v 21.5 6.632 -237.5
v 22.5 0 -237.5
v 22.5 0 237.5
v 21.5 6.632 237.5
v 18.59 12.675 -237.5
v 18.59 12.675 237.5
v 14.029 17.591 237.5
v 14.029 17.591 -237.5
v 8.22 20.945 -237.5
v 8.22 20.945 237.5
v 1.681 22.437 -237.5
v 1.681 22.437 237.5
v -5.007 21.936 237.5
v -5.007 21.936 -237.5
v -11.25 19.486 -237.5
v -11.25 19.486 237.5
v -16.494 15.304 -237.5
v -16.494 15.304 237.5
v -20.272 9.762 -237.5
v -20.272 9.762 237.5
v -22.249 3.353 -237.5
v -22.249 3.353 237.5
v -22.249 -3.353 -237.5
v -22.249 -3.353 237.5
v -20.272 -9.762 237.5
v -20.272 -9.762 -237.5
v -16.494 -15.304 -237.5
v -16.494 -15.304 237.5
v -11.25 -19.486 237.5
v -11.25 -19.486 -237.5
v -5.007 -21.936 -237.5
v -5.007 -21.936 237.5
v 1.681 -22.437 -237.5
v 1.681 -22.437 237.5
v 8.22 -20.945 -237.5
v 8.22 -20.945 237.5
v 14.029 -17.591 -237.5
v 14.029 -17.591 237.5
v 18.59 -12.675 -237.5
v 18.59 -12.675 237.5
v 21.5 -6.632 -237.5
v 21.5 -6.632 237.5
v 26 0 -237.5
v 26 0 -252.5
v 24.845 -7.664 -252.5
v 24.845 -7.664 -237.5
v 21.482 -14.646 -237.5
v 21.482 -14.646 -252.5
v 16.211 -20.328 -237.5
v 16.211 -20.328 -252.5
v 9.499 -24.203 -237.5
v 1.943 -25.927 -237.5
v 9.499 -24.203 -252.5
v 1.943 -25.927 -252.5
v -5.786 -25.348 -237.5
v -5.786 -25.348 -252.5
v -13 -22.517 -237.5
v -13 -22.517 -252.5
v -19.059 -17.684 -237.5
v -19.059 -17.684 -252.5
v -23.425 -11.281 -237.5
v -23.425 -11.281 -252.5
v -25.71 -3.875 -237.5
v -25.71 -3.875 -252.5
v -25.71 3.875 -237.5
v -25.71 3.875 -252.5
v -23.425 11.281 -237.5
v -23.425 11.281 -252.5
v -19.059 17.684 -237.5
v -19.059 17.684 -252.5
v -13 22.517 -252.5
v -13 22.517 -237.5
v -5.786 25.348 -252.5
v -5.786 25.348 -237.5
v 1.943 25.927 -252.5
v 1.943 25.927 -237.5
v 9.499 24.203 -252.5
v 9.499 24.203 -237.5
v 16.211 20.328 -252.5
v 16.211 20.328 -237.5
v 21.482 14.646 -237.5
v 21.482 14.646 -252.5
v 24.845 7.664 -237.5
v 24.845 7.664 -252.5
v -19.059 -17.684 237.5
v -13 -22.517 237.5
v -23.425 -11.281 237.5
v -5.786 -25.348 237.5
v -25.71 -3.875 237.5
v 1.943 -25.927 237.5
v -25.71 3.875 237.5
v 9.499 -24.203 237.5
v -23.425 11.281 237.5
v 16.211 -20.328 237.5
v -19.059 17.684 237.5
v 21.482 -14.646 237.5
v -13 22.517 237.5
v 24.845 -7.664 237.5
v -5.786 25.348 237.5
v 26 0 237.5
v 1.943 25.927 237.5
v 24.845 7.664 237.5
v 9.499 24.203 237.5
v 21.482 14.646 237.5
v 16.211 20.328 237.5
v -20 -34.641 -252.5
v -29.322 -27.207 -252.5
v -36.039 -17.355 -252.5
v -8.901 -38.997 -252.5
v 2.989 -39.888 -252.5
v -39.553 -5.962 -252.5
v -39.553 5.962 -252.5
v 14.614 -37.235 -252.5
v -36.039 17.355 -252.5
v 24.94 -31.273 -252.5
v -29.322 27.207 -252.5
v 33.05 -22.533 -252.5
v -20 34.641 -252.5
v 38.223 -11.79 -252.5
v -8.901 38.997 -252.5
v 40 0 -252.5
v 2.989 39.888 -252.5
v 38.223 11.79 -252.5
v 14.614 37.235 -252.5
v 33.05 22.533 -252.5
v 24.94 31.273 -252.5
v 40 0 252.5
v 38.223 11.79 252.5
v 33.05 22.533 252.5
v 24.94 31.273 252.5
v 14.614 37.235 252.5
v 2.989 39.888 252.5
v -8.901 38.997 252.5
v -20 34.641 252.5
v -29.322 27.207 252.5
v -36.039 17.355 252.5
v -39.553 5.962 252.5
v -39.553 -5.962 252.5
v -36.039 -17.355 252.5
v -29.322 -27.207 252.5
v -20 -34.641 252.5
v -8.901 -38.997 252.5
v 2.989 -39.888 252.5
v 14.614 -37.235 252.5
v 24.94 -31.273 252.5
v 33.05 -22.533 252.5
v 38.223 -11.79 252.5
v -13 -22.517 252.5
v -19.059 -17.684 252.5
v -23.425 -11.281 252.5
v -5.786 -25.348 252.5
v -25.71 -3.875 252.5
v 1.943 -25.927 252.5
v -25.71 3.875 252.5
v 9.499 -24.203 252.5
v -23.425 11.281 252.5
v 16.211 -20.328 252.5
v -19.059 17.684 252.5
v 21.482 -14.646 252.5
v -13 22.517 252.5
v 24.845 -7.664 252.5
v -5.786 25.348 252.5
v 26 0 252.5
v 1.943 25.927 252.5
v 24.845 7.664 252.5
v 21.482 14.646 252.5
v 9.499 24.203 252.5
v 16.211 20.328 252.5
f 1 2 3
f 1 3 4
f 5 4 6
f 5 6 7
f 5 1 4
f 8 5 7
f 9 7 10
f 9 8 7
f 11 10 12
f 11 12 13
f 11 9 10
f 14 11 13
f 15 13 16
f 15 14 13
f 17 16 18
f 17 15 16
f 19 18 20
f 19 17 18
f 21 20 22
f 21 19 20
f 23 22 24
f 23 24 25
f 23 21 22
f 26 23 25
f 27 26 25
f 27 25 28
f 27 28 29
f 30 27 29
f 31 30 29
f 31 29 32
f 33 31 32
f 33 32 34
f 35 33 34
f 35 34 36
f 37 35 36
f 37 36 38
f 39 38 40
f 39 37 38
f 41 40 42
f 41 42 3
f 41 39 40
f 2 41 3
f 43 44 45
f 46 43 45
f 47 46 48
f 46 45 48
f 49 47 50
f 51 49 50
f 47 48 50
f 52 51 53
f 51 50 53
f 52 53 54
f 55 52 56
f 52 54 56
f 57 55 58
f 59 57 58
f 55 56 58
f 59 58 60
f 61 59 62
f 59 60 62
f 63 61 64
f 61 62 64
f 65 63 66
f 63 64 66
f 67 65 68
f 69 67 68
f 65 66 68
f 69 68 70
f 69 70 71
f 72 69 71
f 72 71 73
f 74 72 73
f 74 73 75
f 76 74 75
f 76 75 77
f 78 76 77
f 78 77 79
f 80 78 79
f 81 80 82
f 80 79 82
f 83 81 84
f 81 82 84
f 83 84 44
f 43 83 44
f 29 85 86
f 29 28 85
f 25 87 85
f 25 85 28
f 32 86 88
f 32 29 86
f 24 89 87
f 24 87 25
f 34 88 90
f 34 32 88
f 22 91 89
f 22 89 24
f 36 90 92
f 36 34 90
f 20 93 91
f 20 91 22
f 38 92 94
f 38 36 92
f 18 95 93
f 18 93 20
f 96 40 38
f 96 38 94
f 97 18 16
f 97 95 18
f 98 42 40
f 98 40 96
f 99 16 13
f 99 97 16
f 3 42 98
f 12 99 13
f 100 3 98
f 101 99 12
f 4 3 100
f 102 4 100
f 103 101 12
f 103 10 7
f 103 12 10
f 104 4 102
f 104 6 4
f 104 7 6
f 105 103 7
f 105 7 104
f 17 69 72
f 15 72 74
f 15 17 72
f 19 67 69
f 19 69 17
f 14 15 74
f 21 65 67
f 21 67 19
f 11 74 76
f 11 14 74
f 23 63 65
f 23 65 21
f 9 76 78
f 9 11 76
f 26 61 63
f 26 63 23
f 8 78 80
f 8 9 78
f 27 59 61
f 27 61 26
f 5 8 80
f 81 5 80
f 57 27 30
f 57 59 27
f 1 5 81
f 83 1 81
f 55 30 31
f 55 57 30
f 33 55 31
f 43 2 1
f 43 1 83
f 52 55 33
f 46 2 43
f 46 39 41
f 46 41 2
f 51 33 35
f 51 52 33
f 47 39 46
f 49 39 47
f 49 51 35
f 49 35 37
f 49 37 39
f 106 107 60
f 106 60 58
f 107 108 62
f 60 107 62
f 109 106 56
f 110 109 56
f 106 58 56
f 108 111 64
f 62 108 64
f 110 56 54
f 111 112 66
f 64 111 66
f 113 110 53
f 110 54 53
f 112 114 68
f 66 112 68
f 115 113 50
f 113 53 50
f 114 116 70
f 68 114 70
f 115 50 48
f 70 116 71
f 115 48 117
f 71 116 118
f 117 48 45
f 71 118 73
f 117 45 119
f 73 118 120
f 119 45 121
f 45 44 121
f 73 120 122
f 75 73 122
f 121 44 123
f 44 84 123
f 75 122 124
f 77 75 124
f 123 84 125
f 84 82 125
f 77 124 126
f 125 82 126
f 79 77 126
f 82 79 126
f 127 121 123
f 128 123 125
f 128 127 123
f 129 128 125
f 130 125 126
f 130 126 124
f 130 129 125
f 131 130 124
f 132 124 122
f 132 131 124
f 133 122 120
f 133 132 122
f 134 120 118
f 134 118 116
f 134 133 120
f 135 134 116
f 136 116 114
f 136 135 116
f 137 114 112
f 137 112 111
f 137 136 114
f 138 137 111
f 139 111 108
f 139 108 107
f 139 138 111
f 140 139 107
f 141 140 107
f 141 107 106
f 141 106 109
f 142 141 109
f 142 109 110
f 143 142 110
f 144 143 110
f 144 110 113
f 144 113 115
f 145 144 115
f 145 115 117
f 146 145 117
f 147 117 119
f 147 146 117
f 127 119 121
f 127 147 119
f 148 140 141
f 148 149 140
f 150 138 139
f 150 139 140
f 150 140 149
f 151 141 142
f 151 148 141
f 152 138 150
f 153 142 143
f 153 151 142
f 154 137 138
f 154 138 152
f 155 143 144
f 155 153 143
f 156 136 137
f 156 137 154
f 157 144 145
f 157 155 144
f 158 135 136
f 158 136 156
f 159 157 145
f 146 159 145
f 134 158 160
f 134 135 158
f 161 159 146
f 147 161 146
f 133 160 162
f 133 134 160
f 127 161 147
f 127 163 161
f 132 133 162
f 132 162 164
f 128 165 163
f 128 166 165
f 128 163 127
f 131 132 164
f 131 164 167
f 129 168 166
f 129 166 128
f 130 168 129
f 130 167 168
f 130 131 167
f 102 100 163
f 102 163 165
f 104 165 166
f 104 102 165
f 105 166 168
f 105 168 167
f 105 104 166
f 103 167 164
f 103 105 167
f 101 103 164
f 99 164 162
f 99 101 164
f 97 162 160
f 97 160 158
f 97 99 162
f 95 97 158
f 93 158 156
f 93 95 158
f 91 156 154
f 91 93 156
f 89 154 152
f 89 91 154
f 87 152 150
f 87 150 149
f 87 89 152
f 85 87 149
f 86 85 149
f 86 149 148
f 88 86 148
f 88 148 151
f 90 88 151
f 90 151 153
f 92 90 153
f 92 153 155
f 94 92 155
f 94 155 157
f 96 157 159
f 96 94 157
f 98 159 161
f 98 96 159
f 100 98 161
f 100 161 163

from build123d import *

# Parameters (mm, degrees)
SCHIZZO1_R               = 40
SCHIZZO1_R_2             = 22.5
ESTRUSIONE1_DEPTH        = 252.5
TAGLIO_ESTRUSIONE1_START = -15
SCHIZZO2_R               = 26
SCHIZZO2_R_2             = 22.5
TAGLIO_ESTRUSIONE1_DEPTH = 15
SCHIZZO3_R               = 26
SCHIZZO3_R_2             = 22.5
TAGLIO_ESTRUSIONE2_DEPTH = 15


with BuildPart() as part:
    # Schizzo1 → Estrusione1 (new, symmetric)
    with BuildSketch(Plane.XY):
        Circle(SCHIZZO1_R)
        Circle(SCHIZZO1_R_2, mode=Mode.SUBTRACT)
    extrude(amount=ESTRUSIONE1_DEPTH, both=True)

    # Schizzo2 → Taglio-Estrusione1 (cut)
    with BuildSketch(Plane.XY.offset(252.5).offset(TAGLIO_ESTRUSIONE1_START)):
        Circle(SCHIZZO2_R)
        Circle(SCHIZZO2_R_2, mode=Mode.SUBTRACT)
    extrude(amount=TAGLIO_ESTRUSIONE1_DEPTH, mode=Mode.SUBTRACT)

    # Schizzo3 → Taglio-Estrusione2 (cut)
    with BuildSketch(Plane(origin=(0, 0, -252.5), x_dir=(-1, 0, 0), z_dir=(0, 0, -1))):
        with Locations(Location((0, 0, 0), (0, 0, 180))):
            Circle(SCHIZZO3_R)
        Circle(SCHIZZO3_R_2, mode=Mode.SUBTRACT)
    extrude(amount=-TAGLIO_ESTRUSIONE2_DEPTH, mode=Mode.SUBTRACT)


solid = part.part
